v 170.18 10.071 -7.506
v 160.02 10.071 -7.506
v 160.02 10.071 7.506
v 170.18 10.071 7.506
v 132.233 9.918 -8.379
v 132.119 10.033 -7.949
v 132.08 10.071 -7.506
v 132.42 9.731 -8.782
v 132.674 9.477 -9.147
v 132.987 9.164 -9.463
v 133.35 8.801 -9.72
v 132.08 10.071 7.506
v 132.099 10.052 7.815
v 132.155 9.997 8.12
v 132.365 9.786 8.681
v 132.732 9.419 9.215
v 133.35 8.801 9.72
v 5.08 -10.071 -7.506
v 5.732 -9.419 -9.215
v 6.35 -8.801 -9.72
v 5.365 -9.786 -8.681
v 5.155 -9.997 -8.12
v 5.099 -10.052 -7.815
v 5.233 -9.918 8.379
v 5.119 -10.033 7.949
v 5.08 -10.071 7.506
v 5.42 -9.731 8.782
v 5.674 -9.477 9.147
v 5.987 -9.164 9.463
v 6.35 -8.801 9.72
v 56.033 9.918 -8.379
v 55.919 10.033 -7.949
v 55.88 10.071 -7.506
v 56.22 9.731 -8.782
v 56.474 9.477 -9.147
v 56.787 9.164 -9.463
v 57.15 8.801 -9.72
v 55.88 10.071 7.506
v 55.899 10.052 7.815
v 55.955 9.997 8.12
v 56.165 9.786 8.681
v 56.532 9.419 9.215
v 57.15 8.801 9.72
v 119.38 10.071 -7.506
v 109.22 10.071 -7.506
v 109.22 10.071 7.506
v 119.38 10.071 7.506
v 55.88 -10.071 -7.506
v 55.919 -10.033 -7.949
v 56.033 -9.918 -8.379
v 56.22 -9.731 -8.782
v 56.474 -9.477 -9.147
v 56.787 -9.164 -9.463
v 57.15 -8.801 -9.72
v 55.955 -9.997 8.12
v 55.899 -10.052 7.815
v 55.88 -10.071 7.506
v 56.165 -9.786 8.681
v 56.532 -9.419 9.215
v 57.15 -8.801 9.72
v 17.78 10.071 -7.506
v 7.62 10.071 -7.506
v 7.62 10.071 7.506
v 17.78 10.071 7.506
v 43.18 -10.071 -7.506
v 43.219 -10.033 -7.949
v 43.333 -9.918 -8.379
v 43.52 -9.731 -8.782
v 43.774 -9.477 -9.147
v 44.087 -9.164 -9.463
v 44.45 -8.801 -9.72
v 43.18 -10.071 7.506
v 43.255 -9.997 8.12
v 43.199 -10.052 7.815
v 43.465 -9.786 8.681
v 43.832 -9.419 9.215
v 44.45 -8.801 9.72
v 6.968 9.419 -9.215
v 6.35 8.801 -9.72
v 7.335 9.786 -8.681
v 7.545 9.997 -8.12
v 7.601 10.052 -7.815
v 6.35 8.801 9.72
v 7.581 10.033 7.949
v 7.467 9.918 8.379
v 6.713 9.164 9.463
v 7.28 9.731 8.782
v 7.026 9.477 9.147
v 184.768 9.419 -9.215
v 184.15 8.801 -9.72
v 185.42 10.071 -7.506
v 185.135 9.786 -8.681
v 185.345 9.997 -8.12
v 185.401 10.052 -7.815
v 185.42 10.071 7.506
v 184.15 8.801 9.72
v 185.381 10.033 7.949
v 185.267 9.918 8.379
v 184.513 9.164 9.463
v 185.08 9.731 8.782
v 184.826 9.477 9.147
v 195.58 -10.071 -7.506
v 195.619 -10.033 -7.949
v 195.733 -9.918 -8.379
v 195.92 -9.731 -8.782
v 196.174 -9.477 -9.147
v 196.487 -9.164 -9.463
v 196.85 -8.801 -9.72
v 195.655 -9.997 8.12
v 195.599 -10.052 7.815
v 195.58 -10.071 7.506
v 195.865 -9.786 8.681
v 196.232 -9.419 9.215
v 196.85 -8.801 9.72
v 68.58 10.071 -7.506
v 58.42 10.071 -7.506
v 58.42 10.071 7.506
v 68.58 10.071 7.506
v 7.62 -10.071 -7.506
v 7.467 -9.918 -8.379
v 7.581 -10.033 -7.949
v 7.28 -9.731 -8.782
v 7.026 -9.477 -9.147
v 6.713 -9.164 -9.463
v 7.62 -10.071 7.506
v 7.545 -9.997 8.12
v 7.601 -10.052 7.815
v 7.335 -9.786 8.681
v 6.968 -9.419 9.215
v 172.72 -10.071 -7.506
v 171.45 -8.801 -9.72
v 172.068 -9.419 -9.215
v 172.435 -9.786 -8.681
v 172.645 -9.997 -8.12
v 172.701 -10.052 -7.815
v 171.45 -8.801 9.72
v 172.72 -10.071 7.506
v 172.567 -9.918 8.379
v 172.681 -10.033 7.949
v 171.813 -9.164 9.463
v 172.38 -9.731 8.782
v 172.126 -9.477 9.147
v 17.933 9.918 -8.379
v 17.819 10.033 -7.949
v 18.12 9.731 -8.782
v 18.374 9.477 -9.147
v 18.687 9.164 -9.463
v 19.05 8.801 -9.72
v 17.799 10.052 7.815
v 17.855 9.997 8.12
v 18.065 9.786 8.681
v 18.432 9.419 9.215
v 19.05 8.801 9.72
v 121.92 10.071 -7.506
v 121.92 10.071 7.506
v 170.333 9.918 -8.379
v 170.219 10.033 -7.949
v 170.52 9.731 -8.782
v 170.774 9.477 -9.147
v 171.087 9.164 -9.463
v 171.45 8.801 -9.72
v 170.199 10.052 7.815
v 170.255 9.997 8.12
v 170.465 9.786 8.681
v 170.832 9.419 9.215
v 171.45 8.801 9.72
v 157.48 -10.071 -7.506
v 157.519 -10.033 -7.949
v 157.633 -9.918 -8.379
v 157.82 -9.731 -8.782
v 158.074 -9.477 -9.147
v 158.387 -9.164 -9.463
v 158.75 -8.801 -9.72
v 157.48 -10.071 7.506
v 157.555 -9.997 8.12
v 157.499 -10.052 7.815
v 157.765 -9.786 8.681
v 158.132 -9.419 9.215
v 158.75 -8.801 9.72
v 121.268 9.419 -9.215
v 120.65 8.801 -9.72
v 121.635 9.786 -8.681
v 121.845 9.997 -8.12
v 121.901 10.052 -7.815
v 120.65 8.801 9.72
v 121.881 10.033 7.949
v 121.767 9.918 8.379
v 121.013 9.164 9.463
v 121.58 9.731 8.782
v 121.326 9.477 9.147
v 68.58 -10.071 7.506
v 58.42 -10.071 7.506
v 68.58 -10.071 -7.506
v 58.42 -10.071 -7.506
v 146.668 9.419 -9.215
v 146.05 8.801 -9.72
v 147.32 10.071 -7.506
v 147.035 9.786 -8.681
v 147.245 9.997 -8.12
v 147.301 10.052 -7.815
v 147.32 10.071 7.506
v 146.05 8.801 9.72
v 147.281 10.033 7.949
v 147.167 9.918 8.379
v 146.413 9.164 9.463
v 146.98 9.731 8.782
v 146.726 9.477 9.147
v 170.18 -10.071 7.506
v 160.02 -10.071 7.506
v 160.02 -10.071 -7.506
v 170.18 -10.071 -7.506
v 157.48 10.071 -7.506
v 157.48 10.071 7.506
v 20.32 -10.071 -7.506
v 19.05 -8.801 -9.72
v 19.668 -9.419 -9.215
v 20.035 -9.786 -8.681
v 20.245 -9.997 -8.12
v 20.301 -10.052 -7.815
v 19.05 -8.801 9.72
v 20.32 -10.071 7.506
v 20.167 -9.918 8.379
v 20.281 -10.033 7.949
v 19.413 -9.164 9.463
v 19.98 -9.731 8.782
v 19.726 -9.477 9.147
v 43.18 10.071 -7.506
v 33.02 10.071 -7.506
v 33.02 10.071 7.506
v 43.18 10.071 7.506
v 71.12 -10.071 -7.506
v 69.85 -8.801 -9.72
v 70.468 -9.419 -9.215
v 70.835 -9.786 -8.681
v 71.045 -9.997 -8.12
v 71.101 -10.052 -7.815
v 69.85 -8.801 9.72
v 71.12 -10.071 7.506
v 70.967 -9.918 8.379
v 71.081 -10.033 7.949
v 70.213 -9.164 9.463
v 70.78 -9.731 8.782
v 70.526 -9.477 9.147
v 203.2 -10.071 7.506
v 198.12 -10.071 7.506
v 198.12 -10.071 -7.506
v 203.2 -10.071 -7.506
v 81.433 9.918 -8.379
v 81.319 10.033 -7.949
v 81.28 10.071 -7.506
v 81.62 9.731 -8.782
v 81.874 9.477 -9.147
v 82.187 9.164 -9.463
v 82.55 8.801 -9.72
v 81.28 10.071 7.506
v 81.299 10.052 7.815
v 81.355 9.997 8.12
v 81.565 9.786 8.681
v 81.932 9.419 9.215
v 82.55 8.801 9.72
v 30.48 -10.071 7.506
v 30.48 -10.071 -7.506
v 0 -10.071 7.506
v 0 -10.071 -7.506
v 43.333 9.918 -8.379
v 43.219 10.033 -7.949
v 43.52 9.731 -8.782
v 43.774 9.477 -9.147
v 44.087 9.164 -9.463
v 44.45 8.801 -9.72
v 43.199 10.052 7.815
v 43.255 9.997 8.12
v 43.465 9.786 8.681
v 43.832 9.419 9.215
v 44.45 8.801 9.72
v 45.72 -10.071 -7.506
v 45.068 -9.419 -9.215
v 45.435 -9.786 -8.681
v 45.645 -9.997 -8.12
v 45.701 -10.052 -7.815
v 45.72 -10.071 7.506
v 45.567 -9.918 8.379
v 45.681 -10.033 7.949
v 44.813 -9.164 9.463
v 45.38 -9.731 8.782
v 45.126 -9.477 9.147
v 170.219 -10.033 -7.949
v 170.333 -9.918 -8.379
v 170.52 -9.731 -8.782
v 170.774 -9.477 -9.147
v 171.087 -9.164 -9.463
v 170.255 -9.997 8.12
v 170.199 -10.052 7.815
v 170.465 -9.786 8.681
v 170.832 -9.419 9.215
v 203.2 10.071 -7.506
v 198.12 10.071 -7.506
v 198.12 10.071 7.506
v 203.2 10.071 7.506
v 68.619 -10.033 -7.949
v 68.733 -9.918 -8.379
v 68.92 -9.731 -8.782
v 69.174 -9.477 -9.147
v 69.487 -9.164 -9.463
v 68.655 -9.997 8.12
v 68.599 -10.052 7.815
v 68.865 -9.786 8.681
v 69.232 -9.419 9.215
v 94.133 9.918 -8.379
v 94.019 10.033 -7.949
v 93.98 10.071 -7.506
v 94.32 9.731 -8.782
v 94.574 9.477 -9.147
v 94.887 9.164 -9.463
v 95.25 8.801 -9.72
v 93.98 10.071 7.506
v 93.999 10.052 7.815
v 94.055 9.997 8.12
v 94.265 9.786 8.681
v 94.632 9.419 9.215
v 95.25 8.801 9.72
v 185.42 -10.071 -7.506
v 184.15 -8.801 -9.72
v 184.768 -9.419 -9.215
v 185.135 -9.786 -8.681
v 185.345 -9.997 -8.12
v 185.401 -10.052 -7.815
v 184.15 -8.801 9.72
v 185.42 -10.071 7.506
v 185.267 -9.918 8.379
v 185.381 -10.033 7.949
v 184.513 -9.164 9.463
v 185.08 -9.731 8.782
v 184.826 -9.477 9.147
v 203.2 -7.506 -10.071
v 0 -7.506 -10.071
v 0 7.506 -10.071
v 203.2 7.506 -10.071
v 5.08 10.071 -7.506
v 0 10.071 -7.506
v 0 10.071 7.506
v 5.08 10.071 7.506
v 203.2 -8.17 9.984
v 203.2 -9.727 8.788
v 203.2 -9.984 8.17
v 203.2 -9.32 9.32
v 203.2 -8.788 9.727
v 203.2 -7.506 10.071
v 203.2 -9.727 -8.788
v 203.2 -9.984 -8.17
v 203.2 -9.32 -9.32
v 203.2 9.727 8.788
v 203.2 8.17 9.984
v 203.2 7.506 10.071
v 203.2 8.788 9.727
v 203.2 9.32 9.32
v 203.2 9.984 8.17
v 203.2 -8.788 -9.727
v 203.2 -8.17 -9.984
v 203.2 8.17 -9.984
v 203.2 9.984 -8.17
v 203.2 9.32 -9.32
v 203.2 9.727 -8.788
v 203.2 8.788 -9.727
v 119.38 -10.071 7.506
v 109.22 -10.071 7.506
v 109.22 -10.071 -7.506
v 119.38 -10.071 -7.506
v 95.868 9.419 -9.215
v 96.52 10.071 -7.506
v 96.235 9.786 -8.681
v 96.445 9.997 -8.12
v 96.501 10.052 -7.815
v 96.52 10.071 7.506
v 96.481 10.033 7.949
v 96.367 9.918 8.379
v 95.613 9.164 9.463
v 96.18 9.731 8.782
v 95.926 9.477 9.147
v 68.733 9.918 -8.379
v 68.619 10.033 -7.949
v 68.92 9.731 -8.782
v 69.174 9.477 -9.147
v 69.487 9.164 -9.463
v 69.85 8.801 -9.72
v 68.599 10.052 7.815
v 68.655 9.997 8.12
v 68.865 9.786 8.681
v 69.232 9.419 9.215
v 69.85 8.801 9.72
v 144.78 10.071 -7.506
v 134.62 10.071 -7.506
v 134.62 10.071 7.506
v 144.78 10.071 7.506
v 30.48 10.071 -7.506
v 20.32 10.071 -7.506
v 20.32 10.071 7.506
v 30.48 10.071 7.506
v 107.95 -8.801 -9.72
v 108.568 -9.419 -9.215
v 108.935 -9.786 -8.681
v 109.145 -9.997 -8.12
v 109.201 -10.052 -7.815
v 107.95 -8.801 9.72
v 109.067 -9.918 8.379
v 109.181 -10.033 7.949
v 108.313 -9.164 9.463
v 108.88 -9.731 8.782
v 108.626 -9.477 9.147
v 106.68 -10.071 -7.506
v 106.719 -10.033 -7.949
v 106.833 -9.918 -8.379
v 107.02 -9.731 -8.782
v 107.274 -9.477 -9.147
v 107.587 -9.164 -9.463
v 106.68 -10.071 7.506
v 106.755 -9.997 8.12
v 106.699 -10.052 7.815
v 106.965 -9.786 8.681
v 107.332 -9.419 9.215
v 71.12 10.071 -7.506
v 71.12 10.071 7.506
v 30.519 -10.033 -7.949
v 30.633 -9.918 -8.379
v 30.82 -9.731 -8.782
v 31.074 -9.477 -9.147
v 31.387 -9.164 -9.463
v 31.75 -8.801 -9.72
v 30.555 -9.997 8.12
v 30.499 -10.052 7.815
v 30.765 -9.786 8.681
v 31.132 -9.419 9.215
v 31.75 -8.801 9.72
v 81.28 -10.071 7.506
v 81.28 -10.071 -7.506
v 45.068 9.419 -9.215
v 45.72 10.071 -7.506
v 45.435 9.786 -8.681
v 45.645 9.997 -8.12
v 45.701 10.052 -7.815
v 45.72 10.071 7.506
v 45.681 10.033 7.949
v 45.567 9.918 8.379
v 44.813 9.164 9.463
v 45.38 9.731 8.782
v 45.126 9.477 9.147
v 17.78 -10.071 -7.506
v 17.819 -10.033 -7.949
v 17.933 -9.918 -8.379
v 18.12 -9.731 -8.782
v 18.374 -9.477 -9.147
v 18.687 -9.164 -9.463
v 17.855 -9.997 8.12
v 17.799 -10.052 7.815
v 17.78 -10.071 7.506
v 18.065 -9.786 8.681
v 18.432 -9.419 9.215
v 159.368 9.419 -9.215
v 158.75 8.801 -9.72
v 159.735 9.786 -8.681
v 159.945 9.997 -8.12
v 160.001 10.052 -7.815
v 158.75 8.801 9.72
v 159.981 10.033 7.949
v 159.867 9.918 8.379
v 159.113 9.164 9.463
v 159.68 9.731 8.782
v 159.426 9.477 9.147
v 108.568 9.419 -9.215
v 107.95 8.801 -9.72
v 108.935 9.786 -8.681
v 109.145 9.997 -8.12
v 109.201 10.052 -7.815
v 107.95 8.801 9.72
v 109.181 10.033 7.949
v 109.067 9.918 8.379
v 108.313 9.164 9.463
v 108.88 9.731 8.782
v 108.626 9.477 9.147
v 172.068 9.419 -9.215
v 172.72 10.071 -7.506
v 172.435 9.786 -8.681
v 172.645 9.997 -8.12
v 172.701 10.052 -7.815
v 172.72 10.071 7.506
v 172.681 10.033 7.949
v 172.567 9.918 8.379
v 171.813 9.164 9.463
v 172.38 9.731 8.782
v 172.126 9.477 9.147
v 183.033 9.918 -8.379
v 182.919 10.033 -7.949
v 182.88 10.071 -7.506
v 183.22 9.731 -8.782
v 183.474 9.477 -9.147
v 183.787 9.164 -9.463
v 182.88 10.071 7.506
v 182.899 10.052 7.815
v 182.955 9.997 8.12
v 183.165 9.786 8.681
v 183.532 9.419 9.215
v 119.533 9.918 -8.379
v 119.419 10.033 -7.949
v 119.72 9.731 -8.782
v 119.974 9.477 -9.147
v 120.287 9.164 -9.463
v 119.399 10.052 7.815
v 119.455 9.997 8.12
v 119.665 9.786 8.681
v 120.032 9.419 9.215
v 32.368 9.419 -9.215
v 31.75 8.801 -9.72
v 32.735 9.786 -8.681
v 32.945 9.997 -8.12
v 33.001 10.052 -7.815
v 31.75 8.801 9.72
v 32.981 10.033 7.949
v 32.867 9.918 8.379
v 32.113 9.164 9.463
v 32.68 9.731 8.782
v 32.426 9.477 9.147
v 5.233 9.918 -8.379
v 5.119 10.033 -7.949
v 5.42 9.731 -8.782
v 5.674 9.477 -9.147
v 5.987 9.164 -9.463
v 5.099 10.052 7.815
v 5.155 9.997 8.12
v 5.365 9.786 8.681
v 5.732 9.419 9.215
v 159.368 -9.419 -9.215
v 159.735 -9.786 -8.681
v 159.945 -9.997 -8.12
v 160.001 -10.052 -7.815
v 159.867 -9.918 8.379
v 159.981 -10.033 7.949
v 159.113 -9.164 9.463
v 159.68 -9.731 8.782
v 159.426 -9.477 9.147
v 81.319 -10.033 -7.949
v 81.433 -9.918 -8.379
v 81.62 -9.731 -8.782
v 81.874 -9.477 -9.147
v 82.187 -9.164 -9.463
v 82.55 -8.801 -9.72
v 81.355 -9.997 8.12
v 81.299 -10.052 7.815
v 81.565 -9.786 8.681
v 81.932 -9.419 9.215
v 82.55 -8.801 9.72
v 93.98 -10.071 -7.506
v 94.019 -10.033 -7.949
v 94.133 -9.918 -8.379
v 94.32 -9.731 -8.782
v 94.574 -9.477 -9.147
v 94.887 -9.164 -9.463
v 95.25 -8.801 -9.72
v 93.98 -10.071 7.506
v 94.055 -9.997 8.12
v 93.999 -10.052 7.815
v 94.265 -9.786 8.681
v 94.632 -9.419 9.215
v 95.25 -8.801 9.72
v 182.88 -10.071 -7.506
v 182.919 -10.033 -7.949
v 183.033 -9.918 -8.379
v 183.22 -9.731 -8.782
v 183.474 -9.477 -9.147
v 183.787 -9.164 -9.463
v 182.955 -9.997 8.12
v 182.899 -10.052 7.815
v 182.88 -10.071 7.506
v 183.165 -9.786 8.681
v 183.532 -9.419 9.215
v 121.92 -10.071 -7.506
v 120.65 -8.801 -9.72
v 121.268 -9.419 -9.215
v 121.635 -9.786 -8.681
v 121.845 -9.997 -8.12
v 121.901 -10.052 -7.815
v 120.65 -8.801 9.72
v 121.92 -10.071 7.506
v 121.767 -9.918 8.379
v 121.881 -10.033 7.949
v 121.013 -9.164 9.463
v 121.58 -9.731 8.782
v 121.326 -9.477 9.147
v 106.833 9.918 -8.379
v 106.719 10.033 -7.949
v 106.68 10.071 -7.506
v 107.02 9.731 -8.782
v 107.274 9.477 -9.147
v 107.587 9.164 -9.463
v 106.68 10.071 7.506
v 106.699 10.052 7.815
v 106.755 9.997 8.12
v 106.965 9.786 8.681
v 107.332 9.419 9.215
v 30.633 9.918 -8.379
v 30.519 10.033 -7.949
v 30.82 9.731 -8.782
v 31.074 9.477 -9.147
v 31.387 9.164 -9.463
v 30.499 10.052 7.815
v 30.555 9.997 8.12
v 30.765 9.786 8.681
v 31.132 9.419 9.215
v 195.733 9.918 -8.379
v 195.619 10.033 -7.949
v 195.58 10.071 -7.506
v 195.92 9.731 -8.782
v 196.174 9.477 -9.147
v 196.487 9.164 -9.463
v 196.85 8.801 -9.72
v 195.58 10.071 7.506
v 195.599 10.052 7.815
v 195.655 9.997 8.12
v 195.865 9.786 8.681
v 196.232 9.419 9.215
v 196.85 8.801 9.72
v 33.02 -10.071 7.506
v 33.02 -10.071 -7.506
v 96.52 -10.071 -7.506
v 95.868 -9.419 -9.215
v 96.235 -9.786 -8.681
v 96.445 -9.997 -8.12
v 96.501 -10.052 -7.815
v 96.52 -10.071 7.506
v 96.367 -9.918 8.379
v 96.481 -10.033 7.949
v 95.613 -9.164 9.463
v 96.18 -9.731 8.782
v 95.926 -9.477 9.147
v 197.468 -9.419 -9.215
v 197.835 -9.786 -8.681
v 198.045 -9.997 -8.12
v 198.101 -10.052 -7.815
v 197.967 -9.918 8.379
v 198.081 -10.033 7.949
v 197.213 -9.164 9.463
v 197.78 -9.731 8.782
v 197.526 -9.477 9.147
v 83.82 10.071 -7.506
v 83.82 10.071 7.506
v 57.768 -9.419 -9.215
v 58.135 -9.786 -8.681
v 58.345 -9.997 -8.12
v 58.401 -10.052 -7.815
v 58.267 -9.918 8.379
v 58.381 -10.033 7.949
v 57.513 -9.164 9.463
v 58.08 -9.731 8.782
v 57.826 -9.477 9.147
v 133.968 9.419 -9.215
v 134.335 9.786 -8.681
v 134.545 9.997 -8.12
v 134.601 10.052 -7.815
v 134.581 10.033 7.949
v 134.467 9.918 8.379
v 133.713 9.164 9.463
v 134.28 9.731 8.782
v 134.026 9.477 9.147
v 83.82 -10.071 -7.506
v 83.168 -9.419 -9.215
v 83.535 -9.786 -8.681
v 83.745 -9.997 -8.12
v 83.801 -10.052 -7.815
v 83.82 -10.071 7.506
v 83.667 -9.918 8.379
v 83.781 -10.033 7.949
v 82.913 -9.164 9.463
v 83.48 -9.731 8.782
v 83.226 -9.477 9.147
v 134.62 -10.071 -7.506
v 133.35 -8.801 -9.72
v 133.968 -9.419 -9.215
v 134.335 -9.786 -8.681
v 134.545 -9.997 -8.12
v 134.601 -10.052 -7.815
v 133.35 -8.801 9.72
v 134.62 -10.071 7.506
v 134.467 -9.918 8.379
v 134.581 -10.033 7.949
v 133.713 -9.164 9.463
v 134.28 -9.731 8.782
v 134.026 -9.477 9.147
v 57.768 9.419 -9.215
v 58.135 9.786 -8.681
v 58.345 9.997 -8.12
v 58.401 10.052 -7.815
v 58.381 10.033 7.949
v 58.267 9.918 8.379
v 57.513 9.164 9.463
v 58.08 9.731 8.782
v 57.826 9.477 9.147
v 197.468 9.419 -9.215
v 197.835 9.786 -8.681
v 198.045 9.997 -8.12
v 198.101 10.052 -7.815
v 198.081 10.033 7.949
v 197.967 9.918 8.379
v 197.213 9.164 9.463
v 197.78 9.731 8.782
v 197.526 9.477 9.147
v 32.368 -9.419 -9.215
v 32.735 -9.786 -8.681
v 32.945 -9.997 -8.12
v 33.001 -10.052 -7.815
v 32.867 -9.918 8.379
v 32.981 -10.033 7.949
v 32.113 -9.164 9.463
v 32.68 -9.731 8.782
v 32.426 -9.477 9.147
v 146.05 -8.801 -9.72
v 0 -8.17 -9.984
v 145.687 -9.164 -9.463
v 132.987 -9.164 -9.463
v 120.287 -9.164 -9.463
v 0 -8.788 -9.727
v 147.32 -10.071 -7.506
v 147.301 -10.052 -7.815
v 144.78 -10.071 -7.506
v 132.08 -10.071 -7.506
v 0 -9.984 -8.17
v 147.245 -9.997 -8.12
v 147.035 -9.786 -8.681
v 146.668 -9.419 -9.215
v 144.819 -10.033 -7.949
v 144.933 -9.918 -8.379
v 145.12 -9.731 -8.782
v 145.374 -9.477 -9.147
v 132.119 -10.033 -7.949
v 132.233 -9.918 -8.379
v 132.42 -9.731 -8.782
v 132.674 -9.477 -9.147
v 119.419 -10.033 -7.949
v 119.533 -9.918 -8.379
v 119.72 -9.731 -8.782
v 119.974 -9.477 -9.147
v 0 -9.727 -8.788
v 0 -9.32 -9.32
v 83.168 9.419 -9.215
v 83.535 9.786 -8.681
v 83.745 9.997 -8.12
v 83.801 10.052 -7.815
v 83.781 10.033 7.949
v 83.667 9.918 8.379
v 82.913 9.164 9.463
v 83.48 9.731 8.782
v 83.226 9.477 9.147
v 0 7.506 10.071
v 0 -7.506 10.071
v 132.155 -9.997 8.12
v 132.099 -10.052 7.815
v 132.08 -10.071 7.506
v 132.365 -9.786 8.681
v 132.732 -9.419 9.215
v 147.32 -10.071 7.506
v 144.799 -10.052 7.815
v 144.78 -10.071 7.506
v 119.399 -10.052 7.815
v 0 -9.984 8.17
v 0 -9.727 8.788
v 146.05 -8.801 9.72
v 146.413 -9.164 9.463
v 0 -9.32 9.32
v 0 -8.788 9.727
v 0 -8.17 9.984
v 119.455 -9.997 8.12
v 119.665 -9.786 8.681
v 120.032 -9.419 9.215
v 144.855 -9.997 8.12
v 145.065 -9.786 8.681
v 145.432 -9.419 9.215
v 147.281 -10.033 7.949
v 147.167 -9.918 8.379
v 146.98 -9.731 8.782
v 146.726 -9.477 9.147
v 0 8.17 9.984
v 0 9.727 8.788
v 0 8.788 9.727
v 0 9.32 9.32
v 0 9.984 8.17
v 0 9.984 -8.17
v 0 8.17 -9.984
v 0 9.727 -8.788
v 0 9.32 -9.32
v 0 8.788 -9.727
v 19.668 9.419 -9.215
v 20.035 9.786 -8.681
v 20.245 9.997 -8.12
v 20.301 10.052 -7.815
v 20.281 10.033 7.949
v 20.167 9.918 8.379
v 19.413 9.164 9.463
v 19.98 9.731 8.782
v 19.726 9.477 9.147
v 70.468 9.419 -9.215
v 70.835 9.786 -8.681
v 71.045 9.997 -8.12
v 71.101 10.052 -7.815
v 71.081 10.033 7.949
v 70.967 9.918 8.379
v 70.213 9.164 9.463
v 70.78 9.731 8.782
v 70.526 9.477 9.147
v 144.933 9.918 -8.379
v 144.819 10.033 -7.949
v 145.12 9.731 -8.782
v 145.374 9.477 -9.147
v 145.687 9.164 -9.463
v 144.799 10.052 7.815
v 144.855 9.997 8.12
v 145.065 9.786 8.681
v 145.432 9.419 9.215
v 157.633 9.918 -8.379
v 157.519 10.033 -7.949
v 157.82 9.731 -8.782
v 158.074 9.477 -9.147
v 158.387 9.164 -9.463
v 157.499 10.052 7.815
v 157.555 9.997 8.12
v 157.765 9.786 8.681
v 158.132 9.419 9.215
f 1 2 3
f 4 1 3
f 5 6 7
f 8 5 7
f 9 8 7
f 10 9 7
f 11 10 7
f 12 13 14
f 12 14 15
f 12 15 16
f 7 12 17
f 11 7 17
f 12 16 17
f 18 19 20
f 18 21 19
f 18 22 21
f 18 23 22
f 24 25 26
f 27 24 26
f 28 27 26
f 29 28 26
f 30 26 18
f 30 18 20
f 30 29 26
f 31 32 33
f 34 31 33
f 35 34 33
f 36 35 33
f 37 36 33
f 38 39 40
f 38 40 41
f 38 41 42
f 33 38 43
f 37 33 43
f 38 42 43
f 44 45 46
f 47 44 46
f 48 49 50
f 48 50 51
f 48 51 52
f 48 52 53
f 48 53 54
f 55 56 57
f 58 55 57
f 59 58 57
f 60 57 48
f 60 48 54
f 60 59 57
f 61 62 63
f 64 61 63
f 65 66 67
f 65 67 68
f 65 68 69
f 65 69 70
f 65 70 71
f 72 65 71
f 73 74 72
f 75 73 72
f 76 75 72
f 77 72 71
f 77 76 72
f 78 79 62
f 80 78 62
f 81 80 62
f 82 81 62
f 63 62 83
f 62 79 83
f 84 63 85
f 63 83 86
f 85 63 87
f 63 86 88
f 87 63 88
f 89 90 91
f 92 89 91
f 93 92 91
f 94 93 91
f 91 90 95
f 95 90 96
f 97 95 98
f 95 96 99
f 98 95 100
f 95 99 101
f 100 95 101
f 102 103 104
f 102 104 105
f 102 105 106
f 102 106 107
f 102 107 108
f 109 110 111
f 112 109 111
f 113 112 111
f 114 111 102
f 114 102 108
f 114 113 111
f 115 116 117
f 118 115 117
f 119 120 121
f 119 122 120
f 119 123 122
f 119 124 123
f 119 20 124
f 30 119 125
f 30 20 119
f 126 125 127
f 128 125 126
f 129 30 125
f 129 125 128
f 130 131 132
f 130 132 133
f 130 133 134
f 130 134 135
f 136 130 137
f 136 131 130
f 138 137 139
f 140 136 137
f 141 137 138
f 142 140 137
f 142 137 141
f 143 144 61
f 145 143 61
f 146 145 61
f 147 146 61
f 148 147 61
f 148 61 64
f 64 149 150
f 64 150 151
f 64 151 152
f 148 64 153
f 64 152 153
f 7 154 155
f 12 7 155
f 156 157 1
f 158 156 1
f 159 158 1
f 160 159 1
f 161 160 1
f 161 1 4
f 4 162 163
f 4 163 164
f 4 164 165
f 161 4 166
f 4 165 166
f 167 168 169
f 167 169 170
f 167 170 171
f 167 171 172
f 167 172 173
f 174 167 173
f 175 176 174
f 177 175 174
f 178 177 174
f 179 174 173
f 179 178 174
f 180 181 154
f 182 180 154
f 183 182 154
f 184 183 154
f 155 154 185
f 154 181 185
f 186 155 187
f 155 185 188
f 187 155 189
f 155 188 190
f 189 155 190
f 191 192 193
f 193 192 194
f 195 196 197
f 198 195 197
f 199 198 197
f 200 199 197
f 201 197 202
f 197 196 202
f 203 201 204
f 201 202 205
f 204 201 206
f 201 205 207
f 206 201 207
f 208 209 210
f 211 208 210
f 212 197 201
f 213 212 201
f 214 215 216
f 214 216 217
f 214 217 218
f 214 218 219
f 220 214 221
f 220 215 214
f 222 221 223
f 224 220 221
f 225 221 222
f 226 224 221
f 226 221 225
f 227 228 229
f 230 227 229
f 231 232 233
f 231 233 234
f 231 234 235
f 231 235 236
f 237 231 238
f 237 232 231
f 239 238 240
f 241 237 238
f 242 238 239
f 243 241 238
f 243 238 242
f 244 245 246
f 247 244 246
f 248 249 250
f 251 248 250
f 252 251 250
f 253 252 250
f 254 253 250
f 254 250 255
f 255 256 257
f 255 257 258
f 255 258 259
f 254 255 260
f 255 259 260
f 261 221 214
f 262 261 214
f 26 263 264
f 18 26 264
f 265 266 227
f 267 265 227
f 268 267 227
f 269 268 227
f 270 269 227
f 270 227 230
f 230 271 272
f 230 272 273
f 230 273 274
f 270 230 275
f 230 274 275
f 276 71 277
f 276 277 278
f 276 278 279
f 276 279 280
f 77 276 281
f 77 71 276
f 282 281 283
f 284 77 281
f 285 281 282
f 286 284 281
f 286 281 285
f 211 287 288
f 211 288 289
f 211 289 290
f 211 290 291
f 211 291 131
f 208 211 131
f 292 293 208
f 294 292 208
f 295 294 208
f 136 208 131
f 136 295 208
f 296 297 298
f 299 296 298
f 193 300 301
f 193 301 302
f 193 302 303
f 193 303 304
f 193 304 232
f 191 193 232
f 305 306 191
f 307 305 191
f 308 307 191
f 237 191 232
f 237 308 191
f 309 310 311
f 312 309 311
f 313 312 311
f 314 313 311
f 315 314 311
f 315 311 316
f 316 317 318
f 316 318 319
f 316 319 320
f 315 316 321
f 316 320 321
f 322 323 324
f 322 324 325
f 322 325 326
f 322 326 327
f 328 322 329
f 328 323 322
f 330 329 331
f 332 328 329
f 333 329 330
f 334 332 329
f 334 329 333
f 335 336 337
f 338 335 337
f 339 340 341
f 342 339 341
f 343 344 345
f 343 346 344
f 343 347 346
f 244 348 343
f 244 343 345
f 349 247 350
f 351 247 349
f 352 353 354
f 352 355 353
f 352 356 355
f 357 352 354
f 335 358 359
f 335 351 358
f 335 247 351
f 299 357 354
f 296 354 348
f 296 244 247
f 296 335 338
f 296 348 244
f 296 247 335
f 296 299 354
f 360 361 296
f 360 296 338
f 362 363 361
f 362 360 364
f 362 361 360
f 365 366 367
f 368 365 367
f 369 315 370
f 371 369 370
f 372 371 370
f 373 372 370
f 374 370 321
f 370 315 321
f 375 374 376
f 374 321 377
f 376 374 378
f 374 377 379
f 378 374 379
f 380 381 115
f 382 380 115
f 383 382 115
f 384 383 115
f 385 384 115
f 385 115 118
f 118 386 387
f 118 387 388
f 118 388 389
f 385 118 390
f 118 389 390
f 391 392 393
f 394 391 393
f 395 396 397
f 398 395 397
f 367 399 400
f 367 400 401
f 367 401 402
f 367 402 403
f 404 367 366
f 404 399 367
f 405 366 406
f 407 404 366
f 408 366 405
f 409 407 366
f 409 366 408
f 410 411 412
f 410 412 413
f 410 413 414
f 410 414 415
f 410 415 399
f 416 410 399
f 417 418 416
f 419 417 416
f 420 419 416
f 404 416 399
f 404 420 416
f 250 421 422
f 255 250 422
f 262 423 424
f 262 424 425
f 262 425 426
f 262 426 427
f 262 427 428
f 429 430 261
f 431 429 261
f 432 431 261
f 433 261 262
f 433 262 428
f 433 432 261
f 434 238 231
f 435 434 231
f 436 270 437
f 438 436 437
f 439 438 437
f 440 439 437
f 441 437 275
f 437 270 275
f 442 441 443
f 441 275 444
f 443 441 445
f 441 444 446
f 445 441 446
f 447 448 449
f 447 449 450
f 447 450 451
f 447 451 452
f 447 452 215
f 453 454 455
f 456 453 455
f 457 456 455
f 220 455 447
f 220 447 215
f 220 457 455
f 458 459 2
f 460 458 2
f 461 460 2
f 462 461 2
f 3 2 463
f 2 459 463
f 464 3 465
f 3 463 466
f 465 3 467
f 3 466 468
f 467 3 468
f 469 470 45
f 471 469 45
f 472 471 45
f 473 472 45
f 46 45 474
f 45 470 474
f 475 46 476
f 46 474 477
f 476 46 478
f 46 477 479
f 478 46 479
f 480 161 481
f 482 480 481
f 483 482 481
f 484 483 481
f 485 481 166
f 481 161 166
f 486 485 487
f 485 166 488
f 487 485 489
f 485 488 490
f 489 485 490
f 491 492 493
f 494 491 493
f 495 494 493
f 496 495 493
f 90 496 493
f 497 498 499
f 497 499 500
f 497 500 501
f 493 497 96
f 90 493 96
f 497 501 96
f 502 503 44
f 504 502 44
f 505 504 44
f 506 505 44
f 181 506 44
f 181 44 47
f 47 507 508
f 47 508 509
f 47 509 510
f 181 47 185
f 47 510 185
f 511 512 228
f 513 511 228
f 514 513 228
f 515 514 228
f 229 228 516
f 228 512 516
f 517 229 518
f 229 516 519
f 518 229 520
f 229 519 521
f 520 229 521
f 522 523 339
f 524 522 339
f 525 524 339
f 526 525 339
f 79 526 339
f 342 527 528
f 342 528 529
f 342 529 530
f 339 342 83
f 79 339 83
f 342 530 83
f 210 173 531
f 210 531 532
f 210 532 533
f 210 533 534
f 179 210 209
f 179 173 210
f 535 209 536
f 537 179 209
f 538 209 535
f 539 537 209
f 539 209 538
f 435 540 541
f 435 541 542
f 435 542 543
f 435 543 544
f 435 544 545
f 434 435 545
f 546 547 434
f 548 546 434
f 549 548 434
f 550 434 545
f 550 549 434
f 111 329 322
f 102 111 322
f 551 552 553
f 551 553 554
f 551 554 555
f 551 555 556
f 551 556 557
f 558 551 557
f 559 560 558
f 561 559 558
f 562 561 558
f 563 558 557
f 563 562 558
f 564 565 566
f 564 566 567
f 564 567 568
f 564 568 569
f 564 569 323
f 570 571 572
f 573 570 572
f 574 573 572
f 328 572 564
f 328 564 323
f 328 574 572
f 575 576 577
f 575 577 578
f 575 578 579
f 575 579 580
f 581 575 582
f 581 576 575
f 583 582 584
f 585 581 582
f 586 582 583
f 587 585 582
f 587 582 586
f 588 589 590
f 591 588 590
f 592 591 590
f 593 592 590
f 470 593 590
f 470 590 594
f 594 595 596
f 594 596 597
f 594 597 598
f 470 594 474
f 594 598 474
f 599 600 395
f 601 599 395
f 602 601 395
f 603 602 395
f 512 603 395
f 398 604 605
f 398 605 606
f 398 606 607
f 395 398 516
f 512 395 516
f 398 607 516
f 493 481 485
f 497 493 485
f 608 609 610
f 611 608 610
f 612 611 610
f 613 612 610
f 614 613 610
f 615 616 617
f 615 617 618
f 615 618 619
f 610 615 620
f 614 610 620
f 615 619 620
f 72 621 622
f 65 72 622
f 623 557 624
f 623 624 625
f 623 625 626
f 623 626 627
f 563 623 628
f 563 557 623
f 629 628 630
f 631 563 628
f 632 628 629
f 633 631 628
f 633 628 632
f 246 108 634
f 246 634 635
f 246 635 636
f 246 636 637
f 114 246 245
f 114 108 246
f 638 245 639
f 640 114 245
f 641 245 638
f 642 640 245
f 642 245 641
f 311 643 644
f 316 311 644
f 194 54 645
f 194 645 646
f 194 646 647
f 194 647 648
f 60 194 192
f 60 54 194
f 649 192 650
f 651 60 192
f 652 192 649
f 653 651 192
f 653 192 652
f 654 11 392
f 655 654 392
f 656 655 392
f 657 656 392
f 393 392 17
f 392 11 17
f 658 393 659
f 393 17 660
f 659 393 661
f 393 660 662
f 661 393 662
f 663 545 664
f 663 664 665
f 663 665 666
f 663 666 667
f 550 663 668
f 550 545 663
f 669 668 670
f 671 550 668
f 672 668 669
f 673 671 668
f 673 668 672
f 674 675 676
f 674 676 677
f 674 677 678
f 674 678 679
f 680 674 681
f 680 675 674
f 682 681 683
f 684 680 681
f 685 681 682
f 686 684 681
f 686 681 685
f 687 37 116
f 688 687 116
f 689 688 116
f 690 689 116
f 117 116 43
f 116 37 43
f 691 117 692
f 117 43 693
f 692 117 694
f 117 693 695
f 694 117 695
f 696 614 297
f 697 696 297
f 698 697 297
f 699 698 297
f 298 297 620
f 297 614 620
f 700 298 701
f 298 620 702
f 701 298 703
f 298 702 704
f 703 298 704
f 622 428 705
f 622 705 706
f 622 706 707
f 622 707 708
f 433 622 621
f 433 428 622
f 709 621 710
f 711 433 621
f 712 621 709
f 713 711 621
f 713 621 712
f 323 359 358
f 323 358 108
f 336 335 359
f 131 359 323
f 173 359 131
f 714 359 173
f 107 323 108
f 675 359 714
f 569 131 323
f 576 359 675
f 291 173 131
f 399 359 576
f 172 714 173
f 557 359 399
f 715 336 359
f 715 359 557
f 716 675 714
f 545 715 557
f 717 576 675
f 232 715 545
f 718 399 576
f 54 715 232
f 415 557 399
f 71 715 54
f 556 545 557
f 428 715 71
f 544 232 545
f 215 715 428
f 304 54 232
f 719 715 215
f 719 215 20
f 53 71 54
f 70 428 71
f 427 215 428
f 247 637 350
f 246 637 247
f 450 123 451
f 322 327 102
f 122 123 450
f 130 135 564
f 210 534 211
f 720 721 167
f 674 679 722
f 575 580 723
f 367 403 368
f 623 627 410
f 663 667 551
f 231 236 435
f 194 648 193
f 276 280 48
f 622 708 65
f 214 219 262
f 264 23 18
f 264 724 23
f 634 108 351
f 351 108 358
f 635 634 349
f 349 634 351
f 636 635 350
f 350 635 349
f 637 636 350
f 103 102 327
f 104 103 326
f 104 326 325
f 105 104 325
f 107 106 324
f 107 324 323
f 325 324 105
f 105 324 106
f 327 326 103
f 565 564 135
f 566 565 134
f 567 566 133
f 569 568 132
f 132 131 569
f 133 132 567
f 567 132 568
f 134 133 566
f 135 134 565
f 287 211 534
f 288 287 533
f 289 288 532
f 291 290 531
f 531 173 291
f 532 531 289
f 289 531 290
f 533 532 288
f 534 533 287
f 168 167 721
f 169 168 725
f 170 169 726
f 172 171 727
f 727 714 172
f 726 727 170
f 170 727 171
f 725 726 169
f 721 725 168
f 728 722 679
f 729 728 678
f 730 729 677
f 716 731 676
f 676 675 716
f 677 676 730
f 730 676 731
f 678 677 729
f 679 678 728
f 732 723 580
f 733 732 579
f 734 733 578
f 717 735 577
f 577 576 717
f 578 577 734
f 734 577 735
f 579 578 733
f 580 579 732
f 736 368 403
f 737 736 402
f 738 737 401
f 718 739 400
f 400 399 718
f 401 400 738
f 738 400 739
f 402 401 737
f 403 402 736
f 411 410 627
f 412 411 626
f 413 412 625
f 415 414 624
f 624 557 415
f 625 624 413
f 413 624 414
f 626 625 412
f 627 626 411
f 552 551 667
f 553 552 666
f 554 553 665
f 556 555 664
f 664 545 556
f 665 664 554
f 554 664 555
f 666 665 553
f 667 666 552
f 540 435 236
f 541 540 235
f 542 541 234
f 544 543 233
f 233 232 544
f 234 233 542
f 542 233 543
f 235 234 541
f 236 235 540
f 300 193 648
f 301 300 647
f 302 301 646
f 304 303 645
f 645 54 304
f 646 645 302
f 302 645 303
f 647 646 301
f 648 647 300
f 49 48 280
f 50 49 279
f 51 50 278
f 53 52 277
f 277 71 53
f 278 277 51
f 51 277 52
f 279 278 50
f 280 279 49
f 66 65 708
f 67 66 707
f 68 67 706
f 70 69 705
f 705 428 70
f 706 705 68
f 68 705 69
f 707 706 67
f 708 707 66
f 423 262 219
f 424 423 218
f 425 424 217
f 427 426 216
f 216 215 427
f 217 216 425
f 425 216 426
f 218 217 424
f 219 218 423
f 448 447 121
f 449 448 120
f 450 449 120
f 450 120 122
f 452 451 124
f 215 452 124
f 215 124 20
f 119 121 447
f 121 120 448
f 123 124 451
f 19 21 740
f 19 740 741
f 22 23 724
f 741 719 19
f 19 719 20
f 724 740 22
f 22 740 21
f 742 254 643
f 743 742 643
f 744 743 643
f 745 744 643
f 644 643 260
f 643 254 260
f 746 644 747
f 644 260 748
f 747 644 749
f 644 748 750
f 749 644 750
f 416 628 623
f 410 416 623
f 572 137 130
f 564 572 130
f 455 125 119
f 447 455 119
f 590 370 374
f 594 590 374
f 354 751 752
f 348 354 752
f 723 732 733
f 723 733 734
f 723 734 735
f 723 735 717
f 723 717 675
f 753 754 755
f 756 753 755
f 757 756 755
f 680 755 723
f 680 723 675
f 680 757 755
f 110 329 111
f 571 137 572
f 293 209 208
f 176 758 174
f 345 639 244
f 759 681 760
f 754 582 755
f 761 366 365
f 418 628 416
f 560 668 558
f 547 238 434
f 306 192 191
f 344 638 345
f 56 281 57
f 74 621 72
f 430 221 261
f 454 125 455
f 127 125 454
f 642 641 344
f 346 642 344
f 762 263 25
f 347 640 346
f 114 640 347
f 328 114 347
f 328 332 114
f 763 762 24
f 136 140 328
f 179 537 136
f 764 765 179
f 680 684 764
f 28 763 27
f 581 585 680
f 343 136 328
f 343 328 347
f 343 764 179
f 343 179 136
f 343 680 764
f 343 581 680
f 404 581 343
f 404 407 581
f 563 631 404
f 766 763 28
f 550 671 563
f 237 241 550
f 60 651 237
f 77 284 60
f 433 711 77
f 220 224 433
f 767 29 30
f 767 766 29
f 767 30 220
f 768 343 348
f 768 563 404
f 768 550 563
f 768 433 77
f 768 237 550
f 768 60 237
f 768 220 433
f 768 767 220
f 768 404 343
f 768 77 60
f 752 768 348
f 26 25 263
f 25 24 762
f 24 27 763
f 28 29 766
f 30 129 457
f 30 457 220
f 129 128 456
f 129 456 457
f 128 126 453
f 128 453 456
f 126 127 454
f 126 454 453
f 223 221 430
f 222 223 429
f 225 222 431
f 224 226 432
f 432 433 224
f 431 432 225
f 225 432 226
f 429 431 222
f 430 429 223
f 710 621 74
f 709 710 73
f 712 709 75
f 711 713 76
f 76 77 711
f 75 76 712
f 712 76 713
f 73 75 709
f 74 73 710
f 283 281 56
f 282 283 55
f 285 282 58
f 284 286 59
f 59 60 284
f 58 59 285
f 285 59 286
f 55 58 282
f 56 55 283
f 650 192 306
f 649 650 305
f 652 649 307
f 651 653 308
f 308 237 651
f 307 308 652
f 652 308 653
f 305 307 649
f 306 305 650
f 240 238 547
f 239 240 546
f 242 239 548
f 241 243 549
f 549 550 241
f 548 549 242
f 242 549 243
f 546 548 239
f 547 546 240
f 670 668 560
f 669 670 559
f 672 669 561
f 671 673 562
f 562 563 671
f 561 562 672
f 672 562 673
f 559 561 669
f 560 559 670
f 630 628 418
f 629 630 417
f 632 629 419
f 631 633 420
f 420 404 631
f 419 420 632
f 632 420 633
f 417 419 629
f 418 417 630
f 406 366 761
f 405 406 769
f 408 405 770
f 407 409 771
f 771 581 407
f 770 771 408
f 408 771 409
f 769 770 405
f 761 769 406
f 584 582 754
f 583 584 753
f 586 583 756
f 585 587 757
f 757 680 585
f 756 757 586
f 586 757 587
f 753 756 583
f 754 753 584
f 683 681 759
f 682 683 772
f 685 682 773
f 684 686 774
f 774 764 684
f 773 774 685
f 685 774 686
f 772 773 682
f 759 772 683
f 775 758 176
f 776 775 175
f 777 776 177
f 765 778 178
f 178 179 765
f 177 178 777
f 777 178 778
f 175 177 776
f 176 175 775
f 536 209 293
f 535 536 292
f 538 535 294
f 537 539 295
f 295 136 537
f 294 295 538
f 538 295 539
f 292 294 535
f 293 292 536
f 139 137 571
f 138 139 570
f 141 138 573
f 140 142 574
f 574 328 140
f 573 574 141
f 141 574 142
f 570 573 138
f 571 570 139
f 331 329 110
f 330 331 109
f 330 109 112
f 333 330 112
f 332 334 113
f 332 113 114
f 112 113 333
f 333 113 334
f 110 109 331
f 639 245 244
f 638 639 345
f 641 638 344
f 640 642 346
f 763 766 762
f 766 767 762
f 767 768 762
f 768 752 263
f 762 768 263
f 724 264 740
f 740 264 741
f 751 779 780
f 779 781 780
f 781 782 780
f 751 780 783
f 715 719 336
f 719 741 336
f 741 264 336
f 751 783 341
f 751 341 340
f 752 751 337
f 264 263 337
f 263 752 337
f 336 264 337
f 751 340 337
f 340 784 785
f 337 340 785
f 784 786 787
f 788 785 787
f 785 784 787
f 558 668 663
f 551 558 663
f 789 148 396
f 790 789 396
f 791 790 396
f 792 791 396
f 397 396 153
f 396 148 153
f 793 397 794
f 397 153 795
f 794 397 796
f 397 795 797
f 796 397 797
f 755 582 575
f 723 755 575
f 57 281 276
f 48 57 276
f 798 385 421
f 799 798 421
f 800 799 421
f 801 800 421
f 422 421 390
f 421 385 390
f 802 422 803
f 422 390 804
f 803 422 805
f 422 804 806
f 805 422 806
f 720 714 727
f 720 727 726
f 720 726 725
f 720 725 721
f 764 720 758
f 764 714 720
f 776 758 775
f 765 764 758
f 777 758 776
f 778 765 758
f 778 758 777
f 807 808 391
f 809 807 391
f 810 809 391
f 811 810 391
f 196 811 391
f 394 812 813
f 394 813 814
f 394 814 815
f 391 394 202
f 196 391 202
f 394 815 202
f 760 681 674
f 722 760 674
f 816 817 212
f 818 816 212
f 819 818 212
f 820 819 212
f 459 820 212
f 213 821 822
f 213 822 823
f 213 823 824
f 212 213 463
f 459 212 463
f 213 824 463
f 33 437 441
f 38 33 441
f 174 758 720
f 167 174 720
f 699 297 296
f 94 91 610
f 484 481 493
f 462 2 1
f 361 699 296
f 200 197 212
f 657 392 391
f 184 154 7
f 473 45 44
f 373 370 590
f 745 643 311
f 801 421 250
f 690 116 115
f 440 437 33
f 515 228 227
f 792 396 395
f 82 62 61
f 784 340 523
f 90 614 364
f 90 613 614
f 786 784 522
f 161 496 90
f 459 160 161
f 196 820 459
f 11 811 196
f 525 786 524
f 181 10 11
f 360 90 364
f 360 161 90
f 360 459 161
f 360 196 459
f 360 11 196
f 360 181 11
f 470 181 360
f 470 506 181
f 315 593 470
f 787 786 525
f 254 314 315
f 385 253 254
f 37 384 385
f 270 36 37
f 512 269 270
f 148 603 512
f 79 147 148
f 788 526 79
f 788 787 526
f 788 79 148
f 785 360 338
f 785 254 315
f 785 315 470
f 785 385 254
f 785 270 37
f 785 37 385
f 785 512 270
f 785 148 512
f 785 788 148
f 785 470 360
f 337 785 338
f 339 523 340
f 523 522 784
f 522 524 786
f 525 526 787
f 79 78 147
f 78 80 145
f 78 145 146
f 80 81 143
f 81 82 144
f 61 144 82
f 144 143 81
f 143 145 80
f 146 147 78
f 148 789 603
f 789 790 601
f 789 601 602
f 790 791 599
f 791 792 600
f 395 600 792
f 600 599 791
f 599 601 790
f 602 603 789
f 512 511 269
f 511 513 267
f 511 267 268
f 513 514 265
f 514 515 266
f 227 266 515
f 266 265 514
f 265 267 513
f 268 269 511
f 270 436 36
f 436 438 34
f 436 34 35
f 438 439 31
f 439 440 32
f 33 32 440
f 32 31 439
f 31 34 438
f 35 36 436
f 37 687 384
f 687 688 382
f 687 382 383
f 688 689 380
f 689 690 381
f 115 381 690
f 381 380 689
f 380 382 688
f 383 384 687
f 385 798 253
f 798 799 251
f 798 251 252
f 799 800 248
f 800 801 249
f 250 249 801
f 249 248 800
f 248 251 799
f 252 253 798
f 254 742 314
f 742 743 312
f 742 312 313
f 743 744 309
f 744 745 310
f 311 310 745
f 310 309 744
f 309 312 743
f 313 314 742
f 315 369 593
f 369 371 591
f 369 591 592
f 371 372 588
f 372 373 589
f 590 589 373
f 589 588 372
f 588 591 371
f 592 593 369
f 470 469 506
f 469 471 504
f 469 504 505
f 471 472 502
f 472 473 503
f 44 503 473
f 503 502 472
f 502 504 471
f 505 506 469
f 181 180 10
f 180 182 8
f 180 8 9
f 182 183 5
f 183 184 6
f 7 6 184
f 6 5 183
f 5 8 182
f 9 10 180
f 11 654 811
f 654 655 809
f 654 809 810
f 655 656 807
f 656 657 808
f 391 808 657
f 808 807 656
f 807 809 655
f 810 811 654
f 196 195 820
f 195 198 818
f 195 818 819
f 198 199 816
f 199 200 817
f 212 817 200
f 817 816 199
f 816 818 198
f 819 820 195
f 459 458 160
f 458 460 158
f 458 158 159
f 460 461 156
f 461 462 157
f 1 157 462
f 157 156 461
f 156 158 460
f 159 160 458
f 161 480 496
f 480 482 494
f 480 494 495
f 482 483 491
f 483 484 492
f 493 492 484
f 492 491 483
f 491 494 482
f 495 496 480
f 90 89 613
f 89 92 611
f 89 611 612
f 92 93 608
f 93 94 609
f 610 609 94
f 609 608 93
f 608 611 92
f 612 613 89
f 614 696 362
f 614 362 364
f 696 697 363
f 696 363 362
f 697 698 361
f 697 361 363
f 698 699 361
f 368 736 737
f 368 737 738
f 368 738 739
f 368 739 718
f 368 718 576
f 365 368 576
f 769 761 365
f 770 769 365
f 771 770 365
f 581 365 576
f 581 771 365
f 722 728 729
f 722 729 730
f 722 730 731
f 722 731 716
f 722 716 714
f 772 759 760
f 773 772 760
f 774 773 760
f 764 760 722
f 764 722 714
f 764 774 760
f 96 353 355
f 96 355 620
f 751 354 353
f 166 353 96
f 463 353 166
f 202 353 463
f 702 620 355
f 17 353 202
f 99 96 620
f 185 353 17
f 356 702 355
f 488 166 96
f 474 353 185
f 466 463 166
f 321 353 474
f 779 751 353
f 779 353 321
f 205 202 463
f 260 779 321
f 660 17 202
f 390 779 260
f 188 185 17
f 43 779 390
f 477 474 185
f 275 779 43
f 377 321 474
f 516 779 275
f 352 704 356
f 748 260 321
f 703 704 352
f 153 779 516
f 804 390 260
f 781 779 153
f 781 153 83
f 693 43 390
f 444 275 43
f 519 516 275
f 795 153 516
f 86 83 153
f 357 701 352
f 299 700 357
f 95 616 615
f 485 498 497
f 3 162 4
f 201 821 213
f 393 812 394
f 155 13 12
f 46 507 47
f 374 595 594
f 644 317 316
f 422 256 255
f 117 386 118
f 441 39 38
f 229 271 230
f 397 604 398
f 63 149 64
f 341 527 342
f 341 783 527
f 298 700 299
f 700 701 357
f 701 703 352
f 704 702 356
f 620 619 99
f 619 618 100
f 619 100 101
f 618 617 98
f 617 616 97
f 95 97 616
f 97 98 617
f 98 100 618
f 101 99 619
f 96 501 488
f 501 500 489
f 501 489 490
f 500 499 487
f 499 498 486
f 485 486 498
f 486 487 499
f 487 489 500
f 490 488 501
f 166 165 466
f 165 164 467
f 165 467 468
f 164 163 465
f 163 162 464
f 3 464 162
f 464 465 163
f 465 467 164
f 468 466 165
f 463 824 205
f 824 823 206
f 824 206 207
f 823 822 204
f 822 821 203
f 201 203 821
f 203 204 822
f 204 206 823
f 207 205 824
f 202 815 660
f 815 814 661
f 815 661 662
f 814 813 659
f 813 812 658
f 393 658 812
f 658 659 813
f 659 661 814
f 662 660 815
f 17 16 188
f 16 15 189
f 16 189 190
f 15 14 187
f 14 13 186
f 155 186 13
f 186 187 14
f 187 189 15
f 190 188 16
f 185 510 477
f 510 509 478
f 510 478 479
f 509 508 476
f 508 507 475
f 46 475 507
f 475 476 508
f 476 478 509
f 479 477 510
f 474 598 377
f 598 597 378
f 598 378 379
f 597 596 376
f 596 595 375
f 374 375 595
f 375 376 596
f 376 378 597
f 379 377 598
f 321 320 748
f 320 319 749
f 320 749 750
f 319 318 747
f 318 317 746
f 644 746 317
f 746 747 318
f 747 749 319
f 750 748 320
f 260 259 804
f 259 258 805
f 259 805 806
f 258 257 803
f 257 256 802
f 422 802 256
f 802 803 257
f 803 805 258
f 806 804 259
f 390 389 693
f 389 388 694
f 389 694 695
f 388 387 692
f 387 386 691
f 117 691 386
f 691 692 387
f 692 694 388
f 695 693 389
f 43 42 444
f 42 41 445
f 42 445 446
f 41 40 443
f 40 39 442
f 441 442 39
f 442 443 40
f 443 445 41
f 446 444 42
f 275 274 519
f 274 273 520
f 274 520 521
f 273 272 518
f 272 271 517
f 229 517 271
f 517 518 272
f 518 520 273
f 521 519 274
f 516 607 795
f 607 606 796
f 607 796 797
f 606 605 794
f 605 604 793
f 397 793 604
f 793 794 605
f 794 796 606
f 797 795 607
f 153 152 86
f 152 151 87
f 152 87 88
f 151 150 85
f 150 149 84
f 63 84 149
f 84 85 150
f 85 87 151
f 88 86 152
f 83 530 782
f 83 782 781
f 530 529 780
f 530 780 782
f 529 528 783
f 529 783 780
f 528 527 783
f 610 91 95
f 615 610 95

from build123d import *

# Parameters (mm, degrees)
BOSS_EXTRUDE1_DEPTH   = 203.2
CUT_EXTRUDE1_DEPTH    = 21.1422
LPATTERN1_COUNT       = 16
LPATTERN1_PITCH       = 12.7
MIRROR1_COPY_1_DEPTH  = 21.1422
MIRROR1_COPY_2_DEPTH  = 21.1422
MIRROR1_COPY_3_DEPTH  = 21.1422
MIRROR1_COPY_4_DEPTH  = 21.1422
MIRROR1_COPY_5_DEPTH  = 21.1422
MIRROR1_COPY_6_DEPTH  = 21.1422
MIRROR1_COPY_7_DEPTH  = 21.1422
MIRROR1_COPY_8_DEPTH  = 21.1422
MIRROR1_COPY_9_DEPTH  = 21.1422
MIRROR1_COPY_10_DEPTH = 21.1422
MIRROR1_COPY_11_DEPTH = 21.1422
MIRROR1_COPY_12_DEPTH = 21.1422
MIRROR1_COPY_13_DEPTH = 21.1422
MIRROR1_COPY_14_DEPTH = 21.1422
MIRROR1_COPY_15_DEPTH = 21.1422
SKETCH3_OUTSIDE_W     = 63.18
SKETCH3_OUTSIDE_H     = 63.18
CUT_EXTRUDE2_DEPTH    = 204.2


with BuildPart() as part:
    # Sketch1 → Boss-Extrude1 (new body)
    with BuildSketch(Plane(origin=(0, 0, 0), x_dir=(0, 0, -1), z_dir=(1, 0, 0))):
        Polygon((-7.5311, 10.0711), (-8.583202448, 10.0711), (-10.0711, 8.583202448), (-10.0711, 7.5311), (-10.0711, -7.5311), (-10.0711, -8.583202448), (-8.583202448, -10.0711), (-7.5311, -10.0711), (7.5311, -10.0711), (8.583202448, -10.0711), (10.0711, -8.583202448), (10.0711, -7.5311), (10.0711, 7.5311), (10.0711, 8.583202448), (8.583202448, 10.0711), (7.5311, 10.0711), align=None)
    extrude(amount=BOSS_EXTRUDE1_DEPTH)

    # Sketch2 → Cut-Extrude1 (cut, through all)
    with BuildSketch(Plane.XY.offset(10.0711)):
        Polygon((5.08, 10.0711), (6.35, 8.8011), (7.62, 10.0711), align=None)
    cut_extrude1 = extrude(amount=-CUT_EXTRUDE1_DEPTH, mode=Mode.SUBTRACT)

    # LPattern1: Cut-Extrude1 ×16
    with Locations(*[(i * LPATTERN1_PITCH, 0, 0) for i in range(1, LPATTERN1_COUNT)]):
        add(cut_extrude1, mode=Mode.SUBTRACT)

    # Mirror1: Cut-Extrude1 across plane
    add(cut_extrude1.mirror(Plane.ZX), mode=Mode.SUBTRACT)

    # Mirror1 copy 1 sketch → Mirror1 copy 1 (cut, through all)
    with BuildSketch(Plane(origin=(12.7, 0, 10.0711), x_dir=(1, 0, 0), z_dir=(0, 0, 1))):
        Polygon((5.08, -10.0711), (6.35, -8.8011), (7.62, -10.0711), align=None)
    extrude(amount=-MIRROR1_COPY_1_DEPTH, mode=Mode.SUBTRACT)

    # Mirror1 copy 2 sketch → Mirror1 copy 2 (cut, through all)
    with BuildSketch(Plane(origin=(25.4, 0, 10.0711), x_dir=(1, 0, 0), z_dir=(0, 0, 1))):
        Polygon((5.08, -10.0711), (6.35, -8.8011), (7.62, -10.0711), align=None)
    extrude(amount=-MIRROR1_COPY_2_DEPTH, mode=Mode.SUBTRACT)

    # Mirror1 copy 3 sketch → Mirror1 copy 3 (cut, through all)
    with BuildSketch(Plane(origin=(38.1, 0, 10.0711), x_dir=(1, 0, 0), z_dir=(0, 0, 1))):
        Polygon((5.08, -10.0711), (6.35, -8.8011), (7.62, -10.0711), align=None)
    extrude(amount=-MIRROR1_COPY_3_DEPTH, mode=Mode.SUBTRACT)

    # Mirror1 copy 4 sketch → Mirror1 copy 4 (cut, through all)
    with BuildSketch(Plane(origin=(50.8, 0, 10.0711), x_dir=(1, 0, 0), z_dir=(0, 0, 1))):
        Polygon((5.08, -10.0711), (6.35, -8.8011), (7.62, -10.0711), align=None)
    extrude(amount=-MIRROR1_COPY_4_DEPTH, mode=Mode.SUBTRACT)

    # Mirror1 copy 5 sketch → Mirror1 copy 5 (cut, through all)
    with BuildSketch(Plane(origin=(63.5, 0, 10.0711), x_dir=(1, 0, 0), z_dir=(0, 0, 1))):
        Polygon((5.08, -10.0711), (6.35, -8.8011), (7.62, -10.0711), align=None)
    extrude(amount=-MIRROR1_COPY_5_DEPTH, mode=Mode.SUBTRACT)

    # Mirror1 copy 6 sketch → Mirror1 copy 6 (cut, through all)
    with BuildSketch(Plane(origin=(76.2, 0, 10.0711), x_dir=(1, 0, 0), z_dir=(0, 0, 1))):
        Polygon((5.08, -10.0711), (6.35, -8.8011), (7.62, -10.0711), align=None)
    extrude(amount=-MIRROR1_COPY_6_DEPTH, mode=Mode.SUBTRACT)

    # Mirror1 copy 7 sketch → Mirror1 copy 7 (cut, through all)
    with BuildSketch(Plane(origin=(88.9, 0, 10.0711), x_dir=(1, 0, 0), z_dir=(0, 0, 1))):
        Polygon((5.08, -10.0711), (6.35, -8.8011), (7.62, -10.0711), align=None)
    extrude(amount=-MIRROR1_COPY_7_DEPTH, mode=Mode.SUBTRACT)

    # Mirror1 copy 8 sketch → Mirror1 copy 8 (cut, through all)
    with BuildSketch(Plane(origin=(101.6, 0, 10.0711), x_dir=(1, 0, 0), z_dir=(0, 0, 1))):
        Polygon((5.08, -10.0711), (6.35, -8.8011), (7.62, -10.0711), align=None)
    extrude(amount=-MIRROR1_COPY_8_DEPTH, mode=Mode.SUBTRACT)

    # Mirror1 copy 9 sketch → Mirror1 copy 9 (cut, through all)
    with BuildSketch(Plane(origin=(114.3, 0, 10.0711), x_dir=(1, 0, 0), z_dir=(0, 0, 1))):
        Polygon((5.08, -10.0711), (6.35, -8.8011), (7.62, -10.0711), align=None)
    extrude(amount=-MIRROR1_COPY_9_DEPTH, mode=Mode.SUBTRACT)

    # Mirror1 copy 10 sketch → Mirror1 copy 10 (cut, through all)
    with BuildSketch(Plane(origin=(127, 0, 10.0711), x_dir=(1, 0, 0), z_dir=(0, 0, 1))):
        Polygon((5.08, -10.0711), (6.35, -8.8011), (7.62, -10.0711), align=None)
    extrude(amount=-MIRROR1_COPY_10_DEPTH, mode=Mode.SUBTRACT)

    # Mirror1 copy 11 sketch → Mirror1 copy 11 (cut, through all)
    with BuildSketch(Plane(origin=(139.7, 0, 10.0711), x_dir=(1, 0, 0), z_dir=(0, 0, 1))):
        Polygon((5.08, -10.0711), (6.35, -8.8011), (7.62, -10.0711), align=None)
    extrude(amount=-MIRROR1_COPY_11_DEPTH, mode=Mode.SUBTRACT)

    # Mirror1 copy 12 sketch → Mirror1 copy 12 (cut, through all)
    with BuildSketch(Plane(origin=(152.4, 0, 10.0711), x_dir=(1, 0, 0), z_dir=(0, 0, 1))):
        Polygon((5.08, -10.0711), (6.35, -8.8011), (7.62, -10.0711), align=None)
    extrude(amount=-MIRROR1_COPY_12_DEPTH, mode=Mode.SUBTRACT)

    # Mirror1 copy 13 sketch → Mirror1 copy 13 (cut, through all)
    with BuildSketch(Plane(origin=(165.1, 0, 10.0711), x_dir=(1, 0, 0), z_dir=(0, 0, 1))):
        Polygon((5.08, -10.0711), (6.35, -8.8011), (7.62, -10.0711), align=None)
    extrude(amount=-MIRROR1_COPY_13_DEPTH, mode=Mode.SUBTRACT)

    # Mirror1 copy 14 sketch → Mirror1 copy 14 (cut, through all)
    with BuildSketch(Plane(origin=(177.8, 0, 10.0711), x_dir=(1, 0, 0), z_dir=(0, 0, 1))):
        Polygon((5.08, -10.0711), (6.35, -8.8011), (7.62, -10.0711), align=None)
    extrude(amount=-MIRROR1_COPY_14_DEPTH, mode=Mode.SUBTRACT)

    # Mirror1 copy 15 sketch → Mirror1 copy 15 (cut, through all)
    with BuildSketch(Plane(origin=(190.5, 0, 10.0711), x_dir=(1, 0, 0), z_dir=(0, 0, 1))):
        Polygon((5.08, -10.0711), (6.35, -8.8011), (7.62, -10.0711), align=None)
    extrude(amount=-MIRROR1_COPY_15_DEPTH, mode=Mode.SUBTRACT)

    # Sketch3 outside → Cut-Extrude2 (cut, through all)
    with BuildSketch(Plane.ZY):
        Rectangle(SKETCH3_OUTSIDE_W, SKETCH3_OUTSIDE_H)
        with BuildLine():
            Line((10.0711, -7.5057), (10.0711, 7.5057))
            ThreePointArc((10.0711, 7.5057), (9.319711736, 9.319711736), (7.5057, 10.0711))
            Line((7.5057, 10.0711), (-7.5057, 10.0711))
            ThreePointArc((-7.5057, 10.0711), (-9.319711736, 9.319711736), (-10.0711, 7.5057))
            Line((-10.0711, 7.5057), (-10.0711, -7.5057))
            ThreePointArc((-10.0711, -7.5057), (-9.319711736, -9.319711736), (-7.5057, -10.0711))
            Line((-7.5057, -10.0711), (7.5057, -10.0711))
            ThreePointArc((7.5057, -10.0711), (9.319711736, -9.319711736), (10.0711, -7.5057))
        make_face(mode=Mode.SUBTRACT)
    extrude(amount=-CUT_EXTRUDE2_DEPTH, mode=Mode.SUBTRACT)


solid = part.part
